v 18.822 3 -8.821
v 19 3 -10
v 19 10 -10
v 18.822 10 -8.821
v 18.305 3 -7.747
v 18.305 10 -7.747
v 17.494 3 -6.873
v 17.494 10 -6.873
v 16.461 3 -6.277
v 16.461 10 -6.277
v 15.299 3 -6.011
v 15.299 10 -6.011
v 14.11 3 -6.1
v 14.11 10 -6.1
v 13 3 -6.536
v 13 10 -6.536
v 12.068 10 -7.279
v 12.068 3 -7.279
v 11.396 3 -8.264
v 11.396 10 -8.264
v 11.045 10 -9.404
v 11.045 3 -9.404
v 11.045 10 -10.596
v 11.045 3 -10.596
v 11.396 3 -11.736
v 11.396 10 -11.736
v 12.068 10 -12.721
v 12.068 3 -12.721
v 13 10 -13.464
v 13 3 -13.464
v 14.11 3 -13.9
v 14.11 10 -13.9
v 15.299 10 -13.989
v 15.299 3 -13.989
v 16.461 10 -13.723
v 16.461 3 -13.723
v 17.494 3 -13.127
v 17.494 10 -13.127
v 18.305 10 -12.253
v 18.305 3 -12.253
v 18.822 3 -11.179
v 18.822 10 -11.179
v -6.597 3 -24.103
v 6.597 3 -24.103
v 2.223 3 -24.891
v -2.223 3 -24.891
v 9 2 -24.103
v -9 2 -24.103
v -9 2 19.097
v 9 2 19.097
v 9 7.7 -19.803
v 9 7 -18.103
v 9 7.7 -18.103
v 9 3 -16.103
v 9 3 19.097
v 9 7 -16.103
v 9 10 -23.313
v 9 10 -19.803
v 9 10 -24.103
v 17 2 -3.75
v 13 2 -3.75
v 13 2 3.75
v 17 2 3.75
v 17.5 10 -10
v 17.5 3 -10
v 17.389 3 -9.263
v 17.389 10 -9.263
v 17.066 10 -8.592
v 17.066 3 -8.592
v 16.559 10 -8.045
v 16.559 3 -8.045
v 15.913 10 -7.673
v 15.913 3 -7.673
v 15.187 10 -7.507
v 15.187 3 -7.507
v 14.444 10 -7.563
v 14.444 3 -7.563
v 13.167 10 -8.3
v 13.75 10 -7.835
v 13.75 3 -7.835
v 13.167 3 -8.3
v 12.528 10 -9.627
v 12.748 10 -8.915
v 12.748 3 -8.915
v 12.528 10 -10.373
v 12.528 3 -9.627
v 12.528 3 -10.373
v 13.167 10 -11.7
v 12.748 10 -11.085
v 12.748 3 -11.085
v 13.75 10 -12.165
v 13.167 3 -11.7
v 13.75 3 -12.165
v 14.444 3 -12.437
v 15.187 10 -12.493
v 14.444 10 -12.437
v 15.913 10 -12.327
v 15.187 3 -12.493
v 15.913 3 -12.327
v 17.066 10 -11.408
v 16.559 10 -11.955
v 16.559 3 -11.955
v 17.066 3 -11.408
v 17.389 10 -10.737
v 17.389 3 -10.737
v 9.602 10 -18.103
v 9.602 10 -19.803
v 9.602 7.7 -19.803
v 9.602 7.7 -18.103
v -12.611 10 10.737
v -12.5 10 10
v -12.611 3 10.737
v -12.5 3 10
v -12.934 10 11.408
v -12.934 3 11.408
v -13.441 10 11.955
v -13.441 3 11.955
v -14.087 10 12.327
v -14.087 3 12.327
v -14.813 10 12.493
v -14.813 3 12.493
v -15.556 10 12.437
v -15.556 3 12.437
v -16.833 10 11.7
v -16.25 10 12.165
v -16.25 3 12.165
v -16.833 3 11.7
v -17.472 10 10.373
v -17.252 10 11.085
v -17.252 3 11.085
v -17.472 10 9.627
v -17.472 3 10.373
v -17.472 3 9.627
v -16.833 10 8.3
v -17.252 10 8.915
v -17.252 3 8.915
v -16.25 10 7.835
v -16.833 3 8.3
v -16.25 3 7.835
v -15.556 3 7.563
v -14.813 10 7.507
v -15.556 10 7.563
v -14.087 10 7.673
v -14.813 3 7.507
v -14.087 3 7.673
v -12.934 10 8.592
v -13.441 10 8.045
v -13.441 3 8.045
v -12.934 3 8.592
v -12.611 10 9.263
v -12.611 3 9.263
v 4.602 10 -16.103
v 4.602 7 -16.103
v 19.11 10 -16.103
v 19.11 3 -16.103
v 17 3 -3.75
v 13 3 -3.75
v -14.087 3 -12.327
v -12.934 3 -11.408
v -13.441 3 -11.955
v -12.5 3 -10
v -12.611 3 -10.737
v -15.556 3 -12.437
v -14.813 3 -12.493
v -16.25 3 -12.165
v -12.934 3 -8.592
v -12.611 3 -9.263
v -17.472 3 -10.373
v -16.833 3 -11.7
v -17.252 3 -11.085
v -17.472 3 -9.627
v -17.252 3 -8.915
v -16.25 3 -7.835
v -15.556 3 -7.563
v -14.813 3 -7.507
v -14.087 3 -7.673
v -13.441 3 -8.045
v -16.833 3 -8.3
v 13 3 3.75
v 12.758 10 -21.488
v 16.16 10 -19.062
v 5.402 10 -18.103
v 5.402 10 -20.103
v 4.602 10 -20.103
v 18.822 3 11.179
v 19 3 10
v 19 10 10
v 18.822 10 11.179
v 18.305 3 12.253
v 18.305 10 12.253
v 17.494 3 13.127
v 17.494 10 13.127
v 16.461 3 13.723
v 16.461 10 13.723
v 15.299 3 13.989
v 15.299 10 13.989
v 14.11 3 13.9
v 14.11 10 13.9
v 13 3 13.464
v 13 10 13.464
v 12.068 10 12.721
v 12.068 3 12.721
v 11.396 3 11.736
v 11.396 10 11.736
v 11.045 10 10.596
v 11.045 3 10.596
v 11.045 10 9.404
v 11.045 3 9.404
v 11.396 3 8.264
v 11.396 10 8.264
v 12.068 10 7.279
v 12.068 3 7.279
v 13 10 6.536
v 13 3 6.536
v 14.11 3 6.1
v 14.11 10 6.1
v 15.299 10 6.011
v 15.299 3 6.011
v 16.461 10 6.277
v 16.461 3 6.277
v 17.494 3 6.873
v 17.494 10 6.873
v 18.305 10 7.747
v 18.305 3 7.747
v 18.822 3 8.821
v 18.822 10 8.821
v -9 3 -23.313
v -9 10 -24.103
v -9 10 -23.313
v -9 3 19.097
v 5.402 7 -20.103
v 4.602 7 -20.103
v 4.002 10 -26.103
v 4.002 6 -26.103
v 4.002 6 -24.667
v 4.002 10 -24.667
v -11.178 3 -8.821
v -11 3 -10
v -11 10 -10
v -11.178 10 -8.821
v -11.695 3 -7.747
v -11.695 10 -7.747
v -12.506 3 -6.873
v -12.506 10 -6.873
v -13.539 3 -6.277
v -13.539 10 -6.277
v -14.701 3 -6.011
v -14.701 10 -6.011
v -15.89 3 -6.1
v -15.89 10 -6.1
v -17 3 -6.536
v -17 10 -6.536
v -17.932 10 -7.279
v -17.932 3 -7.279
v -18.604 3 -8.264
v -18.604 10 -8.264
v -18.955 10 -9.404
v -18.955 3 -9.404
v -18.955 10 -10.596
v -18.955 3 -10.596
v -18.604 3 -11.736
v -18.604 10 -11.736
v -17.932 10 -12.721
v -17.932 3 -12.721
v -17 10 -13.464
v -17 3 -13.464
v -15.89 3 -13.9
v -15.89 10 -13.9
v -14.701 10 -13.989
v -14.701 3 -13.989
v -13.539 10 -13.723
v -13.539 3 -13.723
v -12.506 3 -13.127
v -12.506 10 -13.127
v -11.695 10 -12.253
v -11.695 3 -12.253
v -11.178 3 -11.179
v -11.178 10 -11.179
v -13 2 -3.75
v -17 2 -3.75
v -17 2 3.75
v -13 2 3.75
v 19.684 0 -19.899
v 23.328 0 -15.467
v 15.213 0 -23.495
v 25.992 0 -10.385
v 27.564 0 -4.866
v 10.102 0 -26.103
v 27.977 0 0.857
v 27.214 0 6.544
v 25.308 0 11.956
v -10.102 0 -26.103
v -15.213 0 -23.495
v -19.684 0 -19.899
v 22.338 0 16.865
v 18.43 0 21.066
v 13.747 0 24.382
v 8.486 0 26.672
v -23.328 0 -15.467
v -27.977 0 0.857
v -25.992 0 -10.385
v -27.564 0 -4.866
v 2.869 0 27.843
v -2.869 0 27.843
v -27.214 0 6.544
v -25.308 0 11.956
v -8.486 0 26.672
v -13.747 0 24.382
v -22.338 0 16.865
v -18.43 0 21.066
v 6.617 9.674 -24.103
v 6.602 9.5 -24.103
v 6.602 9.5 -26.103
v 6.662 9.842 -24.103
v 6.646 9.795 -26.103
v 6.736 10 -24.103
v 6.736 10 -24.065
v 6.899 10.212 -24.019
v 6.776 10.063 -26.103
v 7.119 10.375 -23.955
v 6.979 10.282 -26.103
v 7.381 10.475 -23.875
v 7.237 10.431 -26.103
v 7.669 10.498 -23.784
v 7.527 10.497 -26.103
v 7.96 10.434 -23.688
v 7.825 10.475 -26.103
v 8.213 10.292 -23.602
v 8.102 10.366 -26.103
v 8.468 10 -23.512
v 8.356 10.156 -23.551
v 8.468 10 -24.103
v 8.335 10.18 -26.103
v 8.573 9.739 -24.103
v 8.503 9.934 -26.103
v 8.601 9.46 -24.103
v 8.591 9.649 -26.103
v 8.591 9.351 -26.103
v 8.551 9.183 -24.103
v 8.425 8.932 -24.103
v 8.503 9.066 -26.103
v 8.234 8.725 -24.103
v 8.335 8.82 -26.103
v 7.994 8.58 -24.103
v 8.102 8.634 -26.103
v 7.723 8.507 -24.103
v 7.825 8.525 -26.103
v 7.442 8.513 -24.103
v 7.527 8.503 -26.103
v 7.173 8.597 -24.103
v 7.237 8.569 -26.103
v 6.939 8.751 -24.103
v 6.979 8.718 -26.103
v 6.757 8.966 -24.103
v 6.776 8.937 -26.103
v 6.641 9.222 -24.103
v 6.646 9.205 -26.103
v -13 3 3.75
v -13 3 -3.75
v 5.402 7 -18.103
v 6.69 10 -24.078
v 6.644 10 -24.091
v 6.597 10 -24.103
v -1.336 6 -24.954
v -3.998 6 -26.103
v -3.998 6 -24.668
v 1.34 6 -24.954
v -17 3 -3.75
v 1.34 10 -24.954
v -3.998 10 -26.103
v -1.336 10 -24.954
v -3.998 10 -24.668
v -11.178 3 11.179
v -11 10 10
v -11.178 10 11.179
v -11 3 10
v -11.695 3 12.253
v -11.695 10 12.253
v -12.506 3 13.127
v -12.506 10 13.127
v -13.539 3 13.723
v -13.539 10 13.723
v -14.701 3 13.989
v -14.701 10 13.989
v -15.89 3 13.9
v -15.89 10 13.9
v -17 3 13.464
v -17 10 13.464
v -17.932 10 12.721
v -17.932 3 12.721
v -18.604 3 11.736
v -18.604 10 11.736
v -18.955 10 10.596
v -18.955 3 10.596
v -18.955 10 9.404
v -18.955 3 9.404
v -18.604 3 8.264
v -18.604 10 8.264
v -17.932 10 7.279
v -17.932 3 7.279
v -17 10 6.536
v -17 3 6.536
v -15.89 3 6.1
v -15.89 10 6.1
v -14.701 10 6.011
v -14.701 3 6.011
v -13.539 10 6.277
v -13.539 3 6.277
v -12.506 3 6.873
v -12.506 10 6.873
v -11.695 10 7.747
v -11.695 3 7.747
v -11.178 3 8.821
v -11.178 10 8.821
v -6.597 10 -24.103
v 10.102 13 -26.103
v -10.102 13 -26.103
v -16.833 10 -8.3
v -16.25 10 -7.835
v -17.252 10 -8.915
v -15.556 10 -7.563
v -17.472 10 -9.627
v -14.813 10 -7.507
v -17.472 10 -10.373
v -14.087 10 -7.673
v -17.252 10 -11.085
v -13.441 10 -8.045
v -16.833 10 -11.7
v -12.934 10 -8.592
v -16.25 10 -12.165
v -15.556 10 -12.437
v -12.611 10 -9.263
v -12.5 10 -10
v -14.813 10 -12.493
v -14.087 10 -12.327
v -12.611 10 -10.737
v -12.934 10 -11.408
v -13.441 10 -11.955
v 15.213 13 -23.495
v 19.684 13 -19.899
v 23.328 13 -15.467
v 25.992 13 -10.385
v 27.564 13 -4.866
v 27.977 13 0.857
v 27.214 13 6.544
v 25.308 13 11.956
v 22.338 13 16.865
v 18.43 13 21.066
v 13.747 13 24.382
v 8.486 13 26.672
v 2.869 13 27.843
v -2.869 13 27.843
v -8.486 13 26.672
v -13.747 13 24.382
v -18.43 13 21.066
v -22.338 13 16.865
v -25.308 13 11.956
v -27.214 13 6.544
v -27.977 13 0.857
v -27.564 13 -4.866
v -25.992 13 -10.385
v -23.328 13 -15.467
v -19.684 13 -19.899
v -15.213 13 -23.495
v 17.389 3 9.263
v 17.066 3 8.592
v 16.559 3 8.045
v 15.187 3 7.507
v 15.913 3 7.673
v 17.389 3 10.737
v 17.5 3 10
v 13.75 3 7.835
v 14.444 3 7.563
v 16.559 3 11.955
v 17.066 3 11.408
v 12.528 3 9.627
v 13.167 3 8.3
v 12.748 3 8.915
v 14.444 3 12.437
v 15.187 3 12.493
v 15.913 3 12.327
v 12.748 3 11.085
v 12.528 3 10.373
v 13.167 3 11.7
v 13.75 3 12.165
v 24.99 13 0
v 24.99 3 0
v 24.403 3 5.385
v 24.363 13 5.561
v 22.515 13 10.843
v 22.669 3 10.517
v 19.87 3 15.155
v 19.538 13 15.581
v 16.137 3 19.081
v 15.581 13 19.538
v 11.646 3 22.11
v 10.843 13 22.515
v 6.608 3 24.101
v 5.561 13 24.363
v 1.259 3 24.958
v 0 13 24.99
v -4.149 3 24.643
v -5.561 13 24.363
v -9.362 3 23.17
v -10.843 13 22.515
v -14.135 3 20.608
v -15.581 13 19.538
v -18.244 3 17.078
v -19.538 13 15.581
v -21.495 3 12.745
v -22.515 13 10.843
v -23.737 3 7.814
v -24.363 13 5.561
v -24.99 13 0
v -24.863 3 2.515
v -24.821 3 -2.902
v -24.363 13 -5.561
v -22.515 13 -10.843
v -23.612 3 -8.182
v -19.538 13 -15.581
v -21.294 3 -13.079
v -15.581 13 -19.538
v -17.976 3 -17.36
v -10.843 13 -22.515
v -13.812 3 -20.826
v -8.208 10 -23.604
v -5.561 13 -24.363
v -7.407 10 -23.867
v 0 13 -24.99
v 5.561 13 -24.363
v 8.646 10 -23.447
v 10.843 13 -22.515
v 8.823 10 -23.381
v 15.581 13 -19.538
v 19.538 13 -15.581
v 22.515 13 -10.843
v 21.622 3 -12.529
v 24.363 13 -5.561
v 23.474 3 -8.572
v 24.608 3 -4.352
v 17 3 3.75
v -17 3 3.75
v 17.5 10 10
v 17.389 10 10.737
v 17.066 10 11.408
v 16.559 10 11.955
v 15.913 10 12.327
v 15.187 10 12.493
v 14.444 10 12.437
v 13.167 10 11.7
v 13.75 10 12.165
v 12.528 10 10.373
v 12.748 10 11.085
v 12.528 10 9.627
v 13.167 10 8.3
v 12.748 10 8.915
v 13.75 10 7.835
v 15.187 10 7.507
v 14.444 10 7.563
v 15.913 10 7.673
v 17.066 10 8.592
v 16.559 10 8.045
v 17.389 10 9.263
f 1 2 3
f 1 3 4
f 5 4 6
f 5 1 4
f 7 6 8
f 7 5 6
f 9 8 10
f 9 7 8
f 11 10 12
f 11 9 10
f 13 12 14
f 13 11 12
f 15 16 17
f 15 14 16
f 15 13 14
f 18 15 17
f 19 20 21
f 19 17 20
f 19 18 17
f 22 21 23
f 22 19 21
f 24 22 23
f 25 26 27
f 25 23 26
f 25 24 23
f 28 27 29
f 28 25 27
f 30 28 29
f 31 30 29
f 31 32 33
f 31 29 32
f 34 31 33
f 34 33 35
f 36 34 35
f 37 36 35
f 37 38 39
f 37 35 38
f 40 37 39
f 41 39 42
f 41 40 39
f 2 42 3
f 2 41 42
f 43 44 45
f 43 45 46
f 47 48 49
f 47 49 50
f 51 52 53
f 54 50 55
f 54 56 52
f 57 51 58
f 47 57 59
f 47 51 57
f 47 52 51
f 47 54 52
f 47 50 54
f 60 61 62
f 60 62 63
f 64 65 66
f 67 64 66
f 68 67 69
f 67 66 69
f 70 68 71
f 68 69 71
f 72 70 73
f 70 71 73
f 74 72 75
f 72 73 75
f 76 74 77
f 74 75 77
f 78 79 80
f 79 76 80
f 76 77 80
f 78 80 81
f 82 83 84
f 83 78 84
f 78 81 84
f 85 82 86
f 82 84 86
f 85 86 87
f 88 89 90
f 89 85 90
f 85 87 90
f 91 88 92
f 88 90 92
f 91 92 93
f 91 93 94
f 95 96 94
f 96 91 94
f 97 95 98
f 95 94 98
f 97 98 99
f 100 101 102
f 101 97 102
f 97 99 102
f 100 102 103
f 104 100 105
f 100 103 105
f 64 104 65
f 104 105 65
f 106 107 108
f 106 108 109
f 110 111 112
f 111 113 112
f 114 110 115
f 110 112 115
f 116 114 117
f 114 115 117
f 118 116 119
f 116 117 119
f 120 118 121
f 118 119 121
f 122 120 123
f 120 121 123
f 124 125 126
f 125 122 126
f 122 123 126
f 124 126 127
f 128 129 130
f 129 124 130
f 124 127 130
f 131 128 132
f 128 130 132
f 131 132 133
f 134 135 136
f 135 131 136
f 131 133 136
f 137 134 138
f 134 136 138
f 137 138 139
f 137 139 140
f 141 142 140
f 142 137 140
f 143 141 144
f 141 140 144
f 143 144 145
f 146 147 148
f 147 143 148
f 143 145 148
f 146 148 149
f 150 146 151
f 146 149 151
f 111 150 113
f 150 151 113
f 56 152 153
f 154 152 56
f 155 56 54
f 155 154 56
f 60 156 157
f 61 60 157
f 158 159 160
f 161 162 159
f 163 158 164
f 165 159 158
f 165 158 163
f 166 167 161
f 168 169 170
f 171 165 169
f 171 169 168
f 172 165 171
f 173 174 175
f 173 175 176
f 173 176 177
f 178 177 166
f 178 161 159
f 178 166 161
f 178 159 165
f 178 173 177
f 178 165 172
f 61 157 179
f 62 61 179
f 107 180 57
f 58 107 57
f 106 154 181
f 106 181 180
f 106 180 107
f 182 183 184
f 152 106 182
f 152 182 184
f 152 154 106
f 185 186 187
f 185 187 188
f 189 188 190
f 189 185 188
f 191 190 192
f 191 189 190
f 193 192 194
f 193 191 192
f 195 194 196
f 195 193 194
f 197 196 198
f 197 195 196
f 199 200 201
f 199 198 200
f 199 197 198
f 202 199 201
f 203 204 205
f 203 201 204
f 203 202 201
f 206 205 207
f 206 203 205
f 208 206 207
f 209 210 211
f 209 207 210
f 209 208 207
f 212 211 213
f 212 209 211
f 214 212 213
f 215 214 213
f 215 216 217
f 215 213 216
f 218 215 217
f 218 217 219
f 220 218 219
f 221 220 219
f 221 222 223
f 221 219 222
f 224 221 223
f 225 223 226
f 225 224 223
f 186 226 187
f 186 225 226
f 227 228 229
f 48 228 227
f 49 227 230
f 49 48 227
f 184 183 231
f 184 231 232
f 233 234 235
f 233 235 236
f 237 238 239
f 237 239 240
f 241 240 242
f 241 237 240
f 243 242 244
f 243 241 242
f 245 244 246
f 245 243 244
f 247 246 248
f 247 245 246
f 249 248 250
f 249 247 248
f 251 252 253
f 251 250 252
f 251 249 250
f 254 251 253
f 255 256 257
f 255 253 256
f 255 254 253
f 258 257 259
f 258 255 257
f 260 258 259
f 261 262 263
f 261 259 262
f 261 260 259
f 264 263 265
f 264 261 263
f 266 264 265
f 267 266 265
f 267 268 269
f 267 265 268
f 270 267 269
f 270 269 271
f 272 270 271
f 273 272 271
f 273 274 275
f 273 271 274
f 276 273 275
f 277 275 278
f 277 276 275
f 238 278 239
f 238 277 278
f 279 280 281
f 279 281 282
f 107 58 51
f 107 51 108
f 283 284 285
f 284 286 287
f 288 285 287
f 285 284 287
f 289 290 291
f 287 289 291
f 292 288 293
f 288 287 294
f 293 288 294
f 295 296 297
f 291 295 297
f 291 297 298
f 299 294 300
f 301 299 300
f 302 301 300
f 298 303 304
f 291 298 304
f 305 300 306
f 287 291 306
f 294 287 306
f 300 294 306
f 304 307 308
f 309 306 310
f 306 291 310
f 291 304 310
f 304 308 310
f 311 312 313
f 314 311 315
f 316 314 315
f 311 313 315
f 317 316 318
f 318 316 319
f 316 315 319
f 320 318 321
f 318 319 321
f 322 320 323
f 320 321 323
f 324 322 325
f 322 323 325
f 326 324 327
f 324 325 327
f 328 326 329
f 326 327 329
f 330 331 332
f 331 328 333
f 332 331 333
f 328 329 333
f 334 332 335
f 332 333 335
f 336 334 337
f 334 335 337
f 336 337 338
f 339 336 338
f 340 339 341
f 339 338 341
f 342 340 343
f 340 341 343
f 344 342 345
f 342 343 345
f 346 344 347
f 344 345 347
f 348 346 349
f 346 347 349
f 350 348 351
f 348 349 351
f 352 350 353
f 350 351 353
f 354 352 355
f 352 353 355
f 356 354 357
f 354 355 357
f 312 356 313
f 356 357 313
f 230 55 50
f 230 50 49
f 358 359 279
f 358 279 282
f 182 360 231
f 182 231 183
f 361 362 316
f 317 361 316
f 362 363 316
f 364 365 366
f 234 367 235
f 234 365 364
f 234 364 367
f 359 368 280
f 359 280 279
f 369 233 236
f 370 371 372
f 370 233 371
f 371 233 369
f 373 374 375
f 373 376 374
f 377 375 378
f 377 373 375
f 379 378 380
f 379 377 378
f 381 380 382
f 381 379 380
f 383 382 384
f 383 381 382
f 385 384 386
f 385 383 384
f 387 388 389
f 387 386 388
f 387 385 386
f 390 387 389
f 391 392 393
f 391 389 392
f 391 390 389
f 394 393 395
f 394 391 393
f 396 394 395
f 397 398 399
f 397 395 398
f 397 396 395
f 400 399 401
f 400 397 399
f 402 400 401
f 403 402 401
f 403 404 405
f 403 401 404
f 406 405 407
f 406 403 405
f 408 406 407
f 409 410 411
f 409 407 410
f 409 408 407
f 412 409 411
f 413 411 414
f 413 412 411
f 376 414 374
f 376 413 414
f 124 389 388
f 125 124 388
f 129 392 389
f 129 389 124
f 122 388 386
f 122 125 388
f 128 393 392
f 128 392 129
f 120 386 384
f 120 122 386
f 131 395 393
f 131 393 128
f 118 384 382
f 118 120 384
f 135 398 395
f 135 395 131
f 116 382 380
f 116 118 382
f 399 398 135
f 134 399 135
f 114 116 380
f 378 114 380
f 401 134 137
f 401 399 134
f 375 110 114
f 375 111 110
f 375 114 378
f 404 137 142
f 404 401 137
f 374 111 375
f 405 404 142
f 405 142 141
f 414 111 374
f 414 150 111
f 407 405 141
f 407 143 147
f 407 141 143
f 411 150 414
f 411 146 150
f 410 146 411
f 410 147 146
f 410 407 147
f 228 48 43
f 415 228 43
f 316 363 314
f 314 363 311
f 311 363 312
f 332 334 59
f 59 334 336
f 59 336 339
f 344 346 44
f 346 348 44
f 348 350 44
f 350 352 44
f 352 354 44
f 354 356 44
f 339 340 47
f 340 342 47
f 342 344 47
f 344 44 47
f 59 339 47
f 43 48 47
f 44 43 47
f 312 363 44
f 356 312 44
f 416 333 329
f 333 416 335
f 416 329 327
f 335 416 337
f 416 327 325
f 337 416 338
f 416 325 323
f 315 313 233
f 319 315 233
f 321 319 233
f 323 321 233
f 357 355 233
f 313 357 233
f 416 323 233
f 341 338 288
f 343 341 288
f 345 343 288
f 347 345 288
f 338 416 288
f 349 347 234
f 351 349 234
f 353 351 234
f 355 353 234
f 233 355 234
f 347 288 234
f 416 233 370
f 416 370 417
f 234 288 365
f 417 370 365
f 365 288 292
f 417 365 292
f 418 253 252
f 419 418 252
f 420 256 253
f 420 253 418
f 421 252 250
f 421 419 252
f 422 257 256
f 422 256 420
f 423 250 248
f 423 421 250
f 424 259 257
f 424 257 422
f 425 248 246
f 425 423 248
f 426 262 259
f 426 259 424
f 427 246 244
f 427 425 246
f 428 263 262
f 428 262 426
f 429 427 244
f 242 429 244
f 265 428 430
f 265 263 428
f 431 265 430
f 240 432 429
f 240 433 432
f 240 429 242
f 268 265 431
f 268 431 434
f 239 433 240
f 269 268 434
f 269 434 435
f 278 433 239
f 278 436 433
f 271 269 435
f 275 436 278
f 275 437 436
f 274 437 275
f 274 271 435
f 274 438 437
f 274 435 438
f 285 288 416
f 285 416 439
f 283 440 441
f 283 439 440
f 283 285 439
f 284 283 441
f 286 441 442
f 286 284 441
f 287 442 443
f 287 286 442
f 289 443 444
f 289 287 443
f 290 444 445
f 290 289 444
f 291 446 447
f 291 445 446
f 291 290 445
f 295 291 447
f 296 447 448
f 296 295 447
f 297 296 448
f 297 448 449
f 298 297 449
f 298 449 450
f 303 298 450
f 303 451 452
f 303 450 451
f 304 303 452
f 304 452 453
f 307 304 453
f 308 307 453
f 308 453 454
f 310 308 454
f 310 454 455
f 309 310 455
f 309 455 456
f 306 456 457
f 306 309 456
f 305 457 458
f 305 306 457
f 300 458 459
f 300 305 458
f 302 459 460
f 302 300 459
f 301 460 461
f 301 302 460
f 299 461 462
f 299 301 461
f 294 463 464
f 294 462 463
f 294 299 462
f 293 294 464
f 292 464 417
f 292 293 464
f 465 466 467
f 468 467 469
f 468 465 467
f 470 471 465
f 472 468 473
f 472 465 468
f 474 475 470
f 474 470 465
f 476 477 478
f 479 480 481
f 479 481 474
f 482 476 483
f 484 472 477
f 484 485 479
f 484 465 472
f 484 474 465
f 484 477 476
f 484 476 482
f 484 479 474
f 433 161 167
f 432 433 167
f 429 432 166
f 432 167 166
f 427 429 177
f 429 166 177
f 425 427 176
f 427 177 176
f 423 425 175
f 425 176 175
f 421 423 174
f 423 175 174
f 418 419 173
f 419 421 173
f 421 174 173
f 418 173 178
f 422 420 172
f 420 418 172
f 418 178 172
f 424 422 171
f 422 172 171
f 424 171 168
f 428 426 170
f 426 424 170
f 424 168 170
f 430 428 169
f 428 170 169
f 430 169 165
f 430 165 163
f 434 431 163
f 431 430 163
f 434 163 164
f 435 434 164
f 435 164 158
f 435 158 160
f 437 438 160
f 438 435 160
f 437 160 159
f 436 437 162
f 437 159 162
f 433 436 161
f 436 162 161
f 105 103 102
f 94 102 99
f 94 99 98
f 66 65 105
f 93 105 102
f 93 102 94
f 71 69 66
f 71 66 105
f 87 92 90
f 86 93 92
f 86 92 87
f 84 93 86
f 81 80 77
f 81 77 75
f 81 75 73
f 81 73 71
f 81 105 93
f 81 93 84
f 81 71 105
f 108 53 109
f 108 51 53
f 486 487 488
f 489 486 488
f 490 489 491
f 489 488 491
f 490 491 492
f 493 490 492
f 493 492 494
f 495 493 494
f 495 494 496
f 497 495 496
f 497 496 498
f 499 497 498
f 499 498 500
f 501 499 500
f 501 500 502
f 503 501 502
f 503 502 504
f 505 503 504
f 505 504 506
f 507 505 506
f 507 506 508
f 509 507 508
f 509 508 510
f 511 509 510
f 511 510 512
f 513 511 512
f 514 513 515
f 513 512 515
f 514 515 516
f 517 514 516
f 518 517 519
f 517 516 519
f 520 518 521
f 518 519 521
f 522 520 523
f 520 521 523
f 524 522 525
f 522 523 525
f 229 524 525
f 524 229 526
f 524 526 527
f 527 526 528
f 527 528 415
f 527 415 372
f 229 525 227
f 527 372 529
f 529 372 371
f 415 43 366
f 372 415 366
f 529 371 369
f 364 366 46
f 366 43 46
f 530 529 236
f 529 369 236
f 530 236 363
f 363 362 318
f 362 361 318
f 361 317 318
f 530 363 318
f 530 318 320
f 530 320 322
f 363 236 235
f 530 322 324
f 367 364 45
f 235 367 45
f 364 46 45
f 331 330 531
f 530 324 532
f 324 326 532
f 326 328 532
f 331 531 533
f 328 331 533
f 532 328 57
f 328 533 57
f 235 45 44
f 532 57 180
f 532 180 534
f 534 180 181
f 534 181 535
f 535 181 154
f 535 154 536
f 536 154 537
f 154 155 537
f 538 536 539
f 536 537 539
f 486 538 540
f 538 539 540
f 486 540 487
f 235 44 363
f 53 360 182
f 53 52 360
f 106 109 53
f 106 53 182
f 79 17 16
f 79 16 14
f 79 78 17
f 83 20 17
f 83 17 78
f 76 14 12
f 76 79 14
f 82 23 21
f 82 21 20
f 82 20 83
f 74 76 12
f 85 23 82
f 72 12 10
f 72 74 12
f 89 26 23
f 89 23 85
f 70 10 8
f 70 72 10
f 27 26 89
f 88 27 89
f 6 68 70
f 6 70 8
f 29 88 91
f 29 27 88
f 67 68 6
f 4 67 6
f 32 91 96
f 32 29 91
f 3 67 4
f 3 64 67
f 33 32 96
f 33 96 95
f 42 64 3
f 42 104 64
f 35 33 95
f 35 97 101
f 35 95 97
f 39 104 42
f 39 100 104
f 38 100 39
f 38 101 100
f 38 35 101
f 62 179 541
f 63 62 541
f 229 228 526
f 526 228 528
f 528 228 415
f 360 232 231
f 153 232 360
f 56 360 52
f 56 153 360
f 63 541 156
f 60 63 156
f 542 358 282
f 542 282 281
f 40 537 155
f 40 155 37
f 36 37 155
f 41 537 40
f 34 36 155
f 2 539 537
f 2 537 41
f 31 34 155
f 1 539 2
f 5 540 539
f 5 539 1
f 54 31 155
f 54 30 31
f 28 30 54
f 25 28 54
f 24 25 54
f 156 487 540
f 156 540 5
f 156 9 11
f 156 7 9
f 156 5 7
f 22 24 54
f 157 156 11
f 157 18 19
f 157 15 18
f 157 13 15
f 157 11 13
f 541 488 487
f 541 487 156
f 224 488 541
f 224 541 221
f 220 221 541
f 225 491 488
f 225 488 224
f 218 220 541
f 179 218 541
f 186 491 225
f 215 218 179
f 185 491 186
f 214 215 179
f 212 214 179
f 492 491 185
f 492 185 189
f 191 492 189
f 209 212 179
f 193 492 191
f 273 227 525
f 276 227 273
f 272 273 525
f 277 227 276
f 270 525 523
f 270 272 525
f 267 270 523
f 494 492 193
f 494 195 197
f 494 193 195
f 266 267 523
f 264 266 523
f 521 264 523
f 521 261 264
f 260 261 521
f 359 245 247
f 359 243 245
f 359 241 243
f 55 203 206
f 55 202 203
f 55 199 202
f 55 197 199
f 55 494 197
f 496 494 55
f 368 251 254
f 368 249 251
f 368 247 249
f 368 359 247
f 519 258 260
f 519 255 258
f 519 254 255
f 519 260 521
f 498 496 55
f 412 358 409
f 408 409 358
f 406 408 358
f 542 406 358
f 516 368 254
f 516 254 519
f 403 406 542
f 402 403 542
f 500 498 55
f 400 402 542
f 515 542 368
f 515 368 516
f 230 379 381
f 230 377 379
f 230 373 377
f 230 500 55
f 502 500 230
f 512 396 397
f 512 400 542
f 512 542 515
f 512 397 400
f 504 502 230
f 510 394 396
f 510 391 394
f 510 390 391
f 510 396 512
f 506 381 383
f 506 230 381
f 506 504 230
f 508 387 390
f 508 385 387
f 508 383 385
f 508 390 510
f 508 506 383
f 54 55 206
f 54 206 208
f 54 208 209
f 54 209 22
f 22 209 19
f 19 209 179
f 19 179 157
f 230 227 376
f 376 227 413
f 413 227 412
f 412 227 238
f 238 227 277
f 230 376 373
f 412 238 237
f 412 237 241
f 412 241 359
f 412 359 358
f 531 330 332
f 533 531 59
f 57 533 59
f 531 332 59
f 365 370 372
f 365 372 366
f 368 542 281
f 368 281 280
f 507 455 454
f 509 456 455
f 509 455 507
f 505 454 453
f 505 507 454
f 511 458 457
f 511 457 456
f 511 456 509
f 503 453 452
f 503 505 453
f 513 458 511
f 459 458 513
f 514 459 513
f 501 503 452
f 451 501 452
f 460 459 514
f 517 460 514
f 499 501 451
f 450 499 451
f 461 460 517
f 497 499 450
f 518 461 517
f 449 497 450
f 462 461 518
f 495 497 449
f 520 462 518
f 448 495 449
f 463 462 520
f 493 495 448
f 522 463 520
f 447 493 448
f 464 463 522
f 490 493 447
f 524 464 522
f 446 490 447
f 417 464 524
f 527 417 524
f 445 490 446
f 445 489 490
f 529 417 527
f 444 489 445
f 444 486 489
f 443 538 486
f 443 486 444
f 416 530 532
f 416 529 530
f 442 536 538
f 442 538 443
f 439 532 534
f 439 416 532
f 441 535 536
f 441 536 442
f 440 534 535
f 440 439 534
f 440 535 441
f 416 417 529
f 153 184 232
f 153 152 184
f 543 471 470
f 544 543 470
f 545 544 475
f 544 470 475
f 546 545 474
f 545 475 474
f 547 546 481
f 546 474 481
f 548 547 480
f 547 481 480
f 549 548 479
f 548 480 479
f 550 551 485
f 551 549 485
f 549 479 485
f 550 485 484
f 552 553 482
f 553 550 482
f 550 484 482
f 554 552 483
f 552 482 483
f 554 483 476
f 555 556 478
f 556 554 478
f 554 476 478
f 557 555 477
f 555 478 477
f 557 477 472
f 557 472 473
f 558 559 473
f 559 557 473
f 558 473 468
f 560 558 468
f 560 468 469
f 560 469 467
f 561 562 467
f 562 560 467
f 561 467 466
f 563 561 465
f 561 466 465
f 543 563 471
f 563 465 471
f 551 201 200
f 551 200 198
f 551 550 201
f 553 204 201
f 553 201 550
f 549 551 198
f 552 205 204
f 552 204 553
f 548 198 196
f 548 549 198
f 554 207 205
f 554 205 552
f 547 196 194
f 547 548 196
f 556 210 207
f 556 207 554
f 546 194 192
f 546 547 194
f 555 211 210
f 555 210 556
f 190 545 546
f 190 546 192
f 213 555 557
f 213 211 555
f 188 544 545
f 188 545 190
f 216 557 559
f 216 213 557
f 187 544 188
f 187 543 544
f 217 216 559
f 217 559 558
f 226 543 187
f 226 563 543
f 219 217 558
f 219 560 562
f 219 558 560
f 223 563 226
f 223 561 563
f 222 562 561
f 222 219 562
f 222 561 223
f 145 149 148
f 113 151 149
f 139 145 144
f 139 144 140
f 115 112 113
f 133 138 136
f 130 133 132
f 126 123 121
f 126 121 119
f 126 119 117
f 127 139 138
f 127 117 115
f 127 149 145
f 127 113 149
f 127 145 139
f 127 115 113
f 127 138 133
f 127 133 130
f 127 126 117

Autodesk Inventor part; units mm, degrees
ref_plane "YZ Plane" through (0, 0, 0) normal (1, 0, 0) x (0, 1, 0)
ref_plane "XZ Plane" through (0, 0, 0) normal (0, 1, 0) x (-1, 0, 0)
ref_plane "XY Plane" through (0, 0, 0) normal (0, 0, 1) x (1, 0, 0)
sketch "Sketch1" plane through (0, 0, 0) normal (0, 1, 0) x (-1, 0, 0)
  line L0 (8.5, 21.5) -> (-8.5, 21.5) construction
  line L1 (-8.5, 21.5) -> (-8.5, -21.5) construction
  line L2 (8.5, -21.5) -> (8.5, 21.5) construction
  line L3 (-8.5, 21.5) -> (8.5, -21.5) construction
  line L4 (-8.5, -21.5) -> (8.5, 21.5) construction
  line L5 (-3.5, -21.5) -> (-3.5, -23.5) construction
  line L6 (-3.5, -23.5) -> (3.5, -23.5) construction
  line L7 (3.5, -23.5) -> (3.5, -21.5) construction
  line L8 (-8.5, -21.5) -> (-3.5, -21.5) construction
  line L9 (3.5, -21.5) -> (8.5, -21.5) construction
  arc A0 (9.5253, -23.1034) -> (-9.5253, -23.1034) centre (0, 0) ccw
  line L10 (9.5253, -23.1034) -> (-9.5253, -23.1034)
  line L11 (-10.102, -26.1034) -> (10.102, -26.1034)
  arc A1 (10.102, -26.1034) -> (-10.102, -26.1034) centre (0, 0) ccw
  dimension "d0" = 43
  dimension "d1" = 17
  dimension "d2" = 7
  dimension "d3" = 2
  dimension "d4" = 3
  dimension "d13" = 20.204
extrude "BASE PLATE" add sketch "Sketch1" along normal blind 3 contours L10 A0 | A1 L11
sketch "Sketch3" plane through (0, 3, 0) normal (0, 1, 0) x (1, 0, 0)
  line L0 (10.102, 26.1034) -> (-10.102, 26.1034) projected
  arc A0 (-10.102, 26.1034) -> (10.102, 26.1034) centre (0, 0) ccw
  arc A1 (-10.102, 26.1034) -> (10.102, 26.1034) centre (0, 0) ccw projected
  line L1 (-10.102, 26.1034) -> (10.102, 26.1034)
  circle A2 centre (0, 0) radius 24.99
  dimension "d58" = 3
extrude "WALLS" add sketch "Sketch3" along normal blind 10
sketch "Sketch6" plane through (0, 3, 0) normal (0, 1, 0) x (1, 0, 0)
  line L0 (-8.5, 21.5) -> (8.5, 21.5) construction
  line L1 (8.5, 21.5) -> (8.5, -21.5) construction
  line L2 (8.5, -21.5) -> (-8.5, -21.5) construction
  line L3 (-8.5, -21.5) -> (-8.5, 21.5) construction
  line L4 (-8.5, -21.5) -> (8.5, 21.5) construction
  line L5 (-8.5, 21.5) -> (8.5, -21.5) construction
  line L6 (0, 0) -> (-15, 0) construction
  line L7 (-15, 0) -> (-15, 10) construction
  line L8 (-15, 10) -> (0, 10) construction
  line L9 (0, 10) -> (0, 0) construction
  circle A0 centre (-15, 10) radius 4
  circle A1 centre (-15, 10) radius 2.5
  circle A2 centre (-15, -10) radius 4
  circle A3 centre (-15, -10) radius 2.5
  circle A4 centre (15, 10) radius 4
  circle A5 centre (15, 10) radius 2.5
  circle A6 centre (15, -10) radius 2.5
  circle A7 centre (15, -10) radius 4
  dimension "d18" = 43
  dimension "d19" = 17
  dimension "d20" = 15
  dimension "d21" = 10
  dimension "d22" = 8
  dimension "d23" = 5
extrude "BUTTON POSTS" add sketch "Sketch6" along normal blind 7
sketch "Sketch7" plane through (0, 3, 0) normal (0, 1, 0) x (1, 0, 0)
  line L0 (-9, 24.1034) -> (9, 24.1034)
  line L1 (9, 24.1034) -> (9, -19.0966)
  line L2 (9, -19.0966) -> (-9, -19.0966)
  line L3 (-9, -19.0966) -> (-9, 24.1034)
  line L4 (-17, 3.75) -> (-13, 3.75)
  line L5 (-13, 3.75) -> (-13, -3.75)
  line L6 (-13, -3.75) -> (-17, -3.75)
  line L7 (-17, -3.75) -> (-17, 3.75)
  line L8 (-24.99, 0) -> (24.99, 0) construction
  line L9 (0, 23.1034) -> (0, -24.99) construction
  line L10 (17, 3.75) -> (13, 3.75)
  line L11 (13, 3.75) -> (13, -3.75)
  line L12 (13, -3.75) -> (17, -3.75)
  line L13 (17, -3.75) -> (17, 3.75)
  line L14 (-9.5253, 24.1034) -> (9.5253, 24.1034) projected
  line L15 (10.102, 26.1034) -> (-10.102, 26.1034) projected
  dimension "d26" = 43.2
  dimension "d27" = 18
  dimension "d28" = 7.5
  dimension "d29" = 4
  dimension "d30" = 3.75
  dimension "d63" = 2
  dimension "d65" = 9
  dimension "d77" = 13
extrude "INDENTATION FOR LINEUP" cut sketch "Sketch7" against normal blind 1
sketch "Sketch9" plane through (0, 2, 0) normal (0, 1, 0) x (1, 0, 0)
  line L0 (-9, 24.1034) -> (9, 24.1034) projected
  line L1 (-9, -19.0966) -> (9, -19.0966)
  line L2 (9, -19.0966) -> (9, 24.1034)
  line L3 (9, 24.1034) -> (-9, 24.1034)
  line L4 (-9, 24.1034) -> (-9, -19.0966)
  point P0 (0, 0)
extrude "FLAT SURFACE FOR ARDUINO" cut sketch "Sketch9" along normal blind 8
sketch "Sketch11" plane through (10.102, 0, -26.1034) normal (0, 0, -1) x (-1, 0, 0)
  line L0 (19.102, 2) -> (1.102, 2) construction
  line L1 (0, 0) -> (0, 13) construction
  line L2 (20.204, 0) -> (20.204, 13) construction
  line L3 (6.1, 10) -> (14.1, 10)
  line L4 (14.1, 10) -> (14.1, 6)
  line L5 (14.1, 6) -> (6.1, 6)
  line L6 (6.1, 6) -> (6.1, 10)
  line L7 (0, 0) -> (20.204, 0) construction
  circle A0 centre (2.5, 9.5) radius 1
  point P0 (10.102, 0)
  dimension "d69" = 4
  dimension "d70" = 4
  dimension "d71" = 6.1
  dimension "d72" = 2
  dimension "d74" = 2.5
  dimension "d78" = 7.5
  dimension "d89" = 8
extrude "I/O HOLES" cut sketch "Sketch11" against normal blind 10
sketch "Sketch12" plane through (0, 3, 0) normal (0, 1, 0) x (1, 0, 0)
  line L0 (19.1097, 16.1034) -> (9, 16.1034)
  line L1 (9, 16.1034) -> (9, 23.3131)
  line L2 (-9, 24.1034) -> (9, 24.1034) construction
  line L3 (-9, -19.0966) -> (-9, 24.1034) construction
  line L4 (9, -19.0966) -> (-9, -19.0966) construction
  line L5 (9, 24.1034) -> (9, -19.0966) construction
  line L6 (10.102, 26.1034) -> (-10.102, 26.1034) projected
  circle A0 centre (0, 0) radius 24.99 construction
  arc A1 (-9, 23.3131) -> (9, 23.3131) centre (0, 0) ccw projected
  arc A2 (19.1097, 16.1034) -> (9, 23.3131) centre (0, 0) ccw
  line L7 (9, 23.3131) -> (9, -19.0966) projected
  point P0 (13, 21.3424)
  dimension "d88" = 10
extrude "Extrusion11" add sketch "Sketch12" along normal blind 7
sketch "Sketch15" plane through (0, 10, 0) normal (0, 1, 0) x (1, 0, 0)
  line L0 (9, 23.3131) -> (9, 16.1034) construction
  line L1 (9, 16.1034) -> (19.1097, 16.1034) construction
  arc A0 (19.1097, 16.1034) -> (9, 23.3131) centre (0, 0) ccw construction
  line L2 (6.602, 26.1034) -> (8.602, 26.1034) construction
  line L3 (8.468, 24.1034) -> (6.736, 24.1034) construction
  line L4 (7.602, 26.1034) -> (7.602, 18.0057) construction
  line L5 (5.602, 19.8034) -> (9.602, 19.8034) construction
  line L6 (9.602, 19.8034) -> (9.602, 18.1034) construction
  line L7 (9.602, 18.1034) -> (5.602, 18.1034) construction
  line L8 (5.602, 18.1034) -> (5.602, 19.8034) construction
  line L9 (9, 19.8034) -> (9.602, 19.8034)
  line L10 (9.602, 19.8034) -> (9.602, 18.1034)
  line L11 (9.602, 18.1034) -> (9, 18.1034)
  line L12 (9, 18.1034) -> (9, 19.8034)
  line L13 (8.468, 23.5115) -> (8.468, 24.1034) projected
  line L14 (6.736, 24.1034) -> (6.736, 24.065) projected
  point P0 (8.602, 24.1034)
  point P1 (6.602, 24.1034)
  point P2 (9, 19.7083)
  dimension "d90" = 4
  dimension "d91" = 2
  dimension "d92" = 1.7
  dimension "d93" = 2
extrude "Extrusion12" cut sketch "Sketch15" against normal blind 2.3
sketch "Sketch16" plane through (9, 2, -24.1034) normal (-1, 0, 0) x (0, 0, 1)
  line L0 (0, 8) -> (0, 6.5) construction
  line L1 (6, 8) -> (8, 8) construction
  line L2 (6, 8) -> (6, 5.7) construction
  line L3 (6, 5.7) -> (4.3, 5.7) construction
  line L4 (4.3, 5.7) -> (4.3, 8) construction
  line L5 (0.7903, 8) -> (4.3, 8) construction
  line L6 (8, 1) -> (8, 8) construction
  line L7 (6, 8) -> (8, 8) construction
  line L8 (14.8538, 7.25) -> (0, 7.25) construction
  line L9 (0, 0) -> (0, 8) construction
  line L10 (6, 8) -> (8, 8)
  line L11 (8, 8) -> (8, 5)
  line L12 (8, 5) -> (6, 5)
  line L13 (6, 5) -> (6, 8)
  point P0 (24.1034, -2)
  dimension "d96" = 3
  dimension "d97" = 2
extrude "Extrusion13" add sketch "Sketch16" along normal blind 4.398
sketch "Sketch17" plane through (9.602, 7.7, -18.1034) normal (0, 0, -1) x (-1, 0, 0)
  line L0 (5, -0.7) -> (4.2, -0.7)
  line L1 (4.2, -0.7) -> (4.2, 2.3)
  line L2 (4.2, 2.3) -> (5, 2.3)
  line L3 (5, 2.3) -> (5, -0.7)
  point P0 (9.602, -7.7)
  dimension "d100" = 3
  dimension "d101" = 0.8
extrude "Extrusion14" add sketch "Sketch17" along normal blind 2
equation "\"d30\" = 0.5 * d28"
equation "\"d65\" = 0.5 * d27"
equation "\"d91\" = 0.5 * d90"
properties part number "Base"
